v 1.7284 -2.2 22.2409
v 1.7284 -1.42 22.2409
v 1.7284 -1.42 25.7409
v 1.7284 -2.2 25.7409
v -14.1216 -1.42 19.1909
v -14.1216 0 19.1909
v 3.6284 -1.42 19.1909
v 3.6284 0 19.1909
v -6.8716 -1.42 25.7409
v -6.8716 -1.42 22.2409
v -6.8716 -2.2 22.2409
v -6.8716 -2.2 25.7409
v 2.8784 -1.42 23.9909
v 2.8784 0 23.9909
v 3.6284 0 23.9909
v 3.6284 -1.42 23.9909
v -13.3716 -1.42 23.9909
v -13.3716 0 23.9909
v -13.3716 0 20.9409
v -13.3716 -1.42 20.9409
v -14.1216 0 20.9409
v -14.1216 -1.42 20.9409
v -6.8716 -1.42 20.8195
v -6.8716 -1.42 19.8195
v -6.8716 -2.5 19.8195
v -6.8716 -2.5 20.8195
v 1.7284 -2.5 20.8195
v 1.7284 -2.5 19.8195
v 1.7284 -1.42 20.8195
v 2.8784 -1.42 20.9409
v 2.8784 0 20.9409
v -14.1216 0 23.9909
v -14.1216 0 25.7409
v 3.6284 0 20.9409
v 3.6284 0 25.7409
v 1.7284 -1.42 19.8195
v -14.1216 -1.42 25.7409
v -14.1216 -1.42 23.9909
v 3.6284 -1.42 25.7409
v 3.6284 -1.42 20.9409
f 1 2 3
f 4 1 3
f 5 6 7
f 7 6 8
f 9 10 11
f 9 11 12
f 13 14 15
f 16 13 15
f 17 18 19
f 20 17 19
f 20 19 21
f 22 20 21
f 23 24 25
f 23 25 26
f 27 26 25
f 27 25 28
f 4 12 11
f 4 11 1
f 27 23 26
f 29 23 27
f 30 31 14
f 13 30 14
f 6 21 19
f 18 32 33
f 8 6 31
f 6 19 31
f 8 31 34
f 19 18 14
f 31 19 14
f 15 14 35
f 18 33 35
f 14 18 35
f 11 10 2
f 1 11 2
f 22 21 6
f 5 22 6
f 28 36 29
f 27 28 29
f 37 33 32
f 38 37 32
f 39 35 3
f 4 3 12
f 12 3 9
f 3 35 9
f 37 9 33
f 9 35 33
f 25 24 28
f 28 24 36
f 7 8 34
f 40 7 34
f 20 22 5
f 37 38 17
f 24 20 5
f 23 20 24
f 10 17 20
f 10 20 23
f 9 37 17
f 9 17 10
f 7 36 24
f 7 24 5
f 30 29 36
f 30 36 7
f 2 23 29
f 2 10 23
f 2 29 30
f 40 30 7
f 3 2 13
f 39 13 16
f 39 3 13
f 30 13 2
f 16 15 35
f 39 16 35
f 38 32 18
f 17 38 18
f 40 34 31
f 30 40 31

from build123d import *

# Parameters (mm, degrees)
F3_DEPTH = 1.42
F1_W     = 8.6
F1_H     = 1
F4_DEPTH = 2.5
F2_W     = 8.6
F2_H     = 3.5
F5_DEPTH = 2.2


with BuildPart() as f3:
    # F0 (on Front) → F3 (new body)
    with BuildSketch(Plane.XZ):
        Polygon((3.628443, 25.740858), (-14.121557, 25.740858), (-14.121557, 23.990858), (-13.371557, 23.990858), (-13.371557, 20.940858), (-14.121557, 20.940858), (-14.121557, 19.190858), (3.628443, 19.190858), (3.628443, 20.940858), (2.878443, 20.940858), (2.878443, 23.990858), (3.628443, 23.990858), align=None)
    extrude(amount=F3_DEPTH)

    # F1 (on face) → F4 (join)
    with BuildSketch(Plane.XZ):
        with Locations((-2.571557, 20.319503)):
            Rectangle(F1_W, F1_H)
    extrude(amount=F4_DEPTH)

    # F2 (on face) → F5 (join)
    with BuildSketch(Plane.XZ):
        with Locations((-2.571557, 23.990858)):
            Rectangle(F2_W, F2_H)
    extrude(amount=F5_DEPTH)


solid = f3.part
